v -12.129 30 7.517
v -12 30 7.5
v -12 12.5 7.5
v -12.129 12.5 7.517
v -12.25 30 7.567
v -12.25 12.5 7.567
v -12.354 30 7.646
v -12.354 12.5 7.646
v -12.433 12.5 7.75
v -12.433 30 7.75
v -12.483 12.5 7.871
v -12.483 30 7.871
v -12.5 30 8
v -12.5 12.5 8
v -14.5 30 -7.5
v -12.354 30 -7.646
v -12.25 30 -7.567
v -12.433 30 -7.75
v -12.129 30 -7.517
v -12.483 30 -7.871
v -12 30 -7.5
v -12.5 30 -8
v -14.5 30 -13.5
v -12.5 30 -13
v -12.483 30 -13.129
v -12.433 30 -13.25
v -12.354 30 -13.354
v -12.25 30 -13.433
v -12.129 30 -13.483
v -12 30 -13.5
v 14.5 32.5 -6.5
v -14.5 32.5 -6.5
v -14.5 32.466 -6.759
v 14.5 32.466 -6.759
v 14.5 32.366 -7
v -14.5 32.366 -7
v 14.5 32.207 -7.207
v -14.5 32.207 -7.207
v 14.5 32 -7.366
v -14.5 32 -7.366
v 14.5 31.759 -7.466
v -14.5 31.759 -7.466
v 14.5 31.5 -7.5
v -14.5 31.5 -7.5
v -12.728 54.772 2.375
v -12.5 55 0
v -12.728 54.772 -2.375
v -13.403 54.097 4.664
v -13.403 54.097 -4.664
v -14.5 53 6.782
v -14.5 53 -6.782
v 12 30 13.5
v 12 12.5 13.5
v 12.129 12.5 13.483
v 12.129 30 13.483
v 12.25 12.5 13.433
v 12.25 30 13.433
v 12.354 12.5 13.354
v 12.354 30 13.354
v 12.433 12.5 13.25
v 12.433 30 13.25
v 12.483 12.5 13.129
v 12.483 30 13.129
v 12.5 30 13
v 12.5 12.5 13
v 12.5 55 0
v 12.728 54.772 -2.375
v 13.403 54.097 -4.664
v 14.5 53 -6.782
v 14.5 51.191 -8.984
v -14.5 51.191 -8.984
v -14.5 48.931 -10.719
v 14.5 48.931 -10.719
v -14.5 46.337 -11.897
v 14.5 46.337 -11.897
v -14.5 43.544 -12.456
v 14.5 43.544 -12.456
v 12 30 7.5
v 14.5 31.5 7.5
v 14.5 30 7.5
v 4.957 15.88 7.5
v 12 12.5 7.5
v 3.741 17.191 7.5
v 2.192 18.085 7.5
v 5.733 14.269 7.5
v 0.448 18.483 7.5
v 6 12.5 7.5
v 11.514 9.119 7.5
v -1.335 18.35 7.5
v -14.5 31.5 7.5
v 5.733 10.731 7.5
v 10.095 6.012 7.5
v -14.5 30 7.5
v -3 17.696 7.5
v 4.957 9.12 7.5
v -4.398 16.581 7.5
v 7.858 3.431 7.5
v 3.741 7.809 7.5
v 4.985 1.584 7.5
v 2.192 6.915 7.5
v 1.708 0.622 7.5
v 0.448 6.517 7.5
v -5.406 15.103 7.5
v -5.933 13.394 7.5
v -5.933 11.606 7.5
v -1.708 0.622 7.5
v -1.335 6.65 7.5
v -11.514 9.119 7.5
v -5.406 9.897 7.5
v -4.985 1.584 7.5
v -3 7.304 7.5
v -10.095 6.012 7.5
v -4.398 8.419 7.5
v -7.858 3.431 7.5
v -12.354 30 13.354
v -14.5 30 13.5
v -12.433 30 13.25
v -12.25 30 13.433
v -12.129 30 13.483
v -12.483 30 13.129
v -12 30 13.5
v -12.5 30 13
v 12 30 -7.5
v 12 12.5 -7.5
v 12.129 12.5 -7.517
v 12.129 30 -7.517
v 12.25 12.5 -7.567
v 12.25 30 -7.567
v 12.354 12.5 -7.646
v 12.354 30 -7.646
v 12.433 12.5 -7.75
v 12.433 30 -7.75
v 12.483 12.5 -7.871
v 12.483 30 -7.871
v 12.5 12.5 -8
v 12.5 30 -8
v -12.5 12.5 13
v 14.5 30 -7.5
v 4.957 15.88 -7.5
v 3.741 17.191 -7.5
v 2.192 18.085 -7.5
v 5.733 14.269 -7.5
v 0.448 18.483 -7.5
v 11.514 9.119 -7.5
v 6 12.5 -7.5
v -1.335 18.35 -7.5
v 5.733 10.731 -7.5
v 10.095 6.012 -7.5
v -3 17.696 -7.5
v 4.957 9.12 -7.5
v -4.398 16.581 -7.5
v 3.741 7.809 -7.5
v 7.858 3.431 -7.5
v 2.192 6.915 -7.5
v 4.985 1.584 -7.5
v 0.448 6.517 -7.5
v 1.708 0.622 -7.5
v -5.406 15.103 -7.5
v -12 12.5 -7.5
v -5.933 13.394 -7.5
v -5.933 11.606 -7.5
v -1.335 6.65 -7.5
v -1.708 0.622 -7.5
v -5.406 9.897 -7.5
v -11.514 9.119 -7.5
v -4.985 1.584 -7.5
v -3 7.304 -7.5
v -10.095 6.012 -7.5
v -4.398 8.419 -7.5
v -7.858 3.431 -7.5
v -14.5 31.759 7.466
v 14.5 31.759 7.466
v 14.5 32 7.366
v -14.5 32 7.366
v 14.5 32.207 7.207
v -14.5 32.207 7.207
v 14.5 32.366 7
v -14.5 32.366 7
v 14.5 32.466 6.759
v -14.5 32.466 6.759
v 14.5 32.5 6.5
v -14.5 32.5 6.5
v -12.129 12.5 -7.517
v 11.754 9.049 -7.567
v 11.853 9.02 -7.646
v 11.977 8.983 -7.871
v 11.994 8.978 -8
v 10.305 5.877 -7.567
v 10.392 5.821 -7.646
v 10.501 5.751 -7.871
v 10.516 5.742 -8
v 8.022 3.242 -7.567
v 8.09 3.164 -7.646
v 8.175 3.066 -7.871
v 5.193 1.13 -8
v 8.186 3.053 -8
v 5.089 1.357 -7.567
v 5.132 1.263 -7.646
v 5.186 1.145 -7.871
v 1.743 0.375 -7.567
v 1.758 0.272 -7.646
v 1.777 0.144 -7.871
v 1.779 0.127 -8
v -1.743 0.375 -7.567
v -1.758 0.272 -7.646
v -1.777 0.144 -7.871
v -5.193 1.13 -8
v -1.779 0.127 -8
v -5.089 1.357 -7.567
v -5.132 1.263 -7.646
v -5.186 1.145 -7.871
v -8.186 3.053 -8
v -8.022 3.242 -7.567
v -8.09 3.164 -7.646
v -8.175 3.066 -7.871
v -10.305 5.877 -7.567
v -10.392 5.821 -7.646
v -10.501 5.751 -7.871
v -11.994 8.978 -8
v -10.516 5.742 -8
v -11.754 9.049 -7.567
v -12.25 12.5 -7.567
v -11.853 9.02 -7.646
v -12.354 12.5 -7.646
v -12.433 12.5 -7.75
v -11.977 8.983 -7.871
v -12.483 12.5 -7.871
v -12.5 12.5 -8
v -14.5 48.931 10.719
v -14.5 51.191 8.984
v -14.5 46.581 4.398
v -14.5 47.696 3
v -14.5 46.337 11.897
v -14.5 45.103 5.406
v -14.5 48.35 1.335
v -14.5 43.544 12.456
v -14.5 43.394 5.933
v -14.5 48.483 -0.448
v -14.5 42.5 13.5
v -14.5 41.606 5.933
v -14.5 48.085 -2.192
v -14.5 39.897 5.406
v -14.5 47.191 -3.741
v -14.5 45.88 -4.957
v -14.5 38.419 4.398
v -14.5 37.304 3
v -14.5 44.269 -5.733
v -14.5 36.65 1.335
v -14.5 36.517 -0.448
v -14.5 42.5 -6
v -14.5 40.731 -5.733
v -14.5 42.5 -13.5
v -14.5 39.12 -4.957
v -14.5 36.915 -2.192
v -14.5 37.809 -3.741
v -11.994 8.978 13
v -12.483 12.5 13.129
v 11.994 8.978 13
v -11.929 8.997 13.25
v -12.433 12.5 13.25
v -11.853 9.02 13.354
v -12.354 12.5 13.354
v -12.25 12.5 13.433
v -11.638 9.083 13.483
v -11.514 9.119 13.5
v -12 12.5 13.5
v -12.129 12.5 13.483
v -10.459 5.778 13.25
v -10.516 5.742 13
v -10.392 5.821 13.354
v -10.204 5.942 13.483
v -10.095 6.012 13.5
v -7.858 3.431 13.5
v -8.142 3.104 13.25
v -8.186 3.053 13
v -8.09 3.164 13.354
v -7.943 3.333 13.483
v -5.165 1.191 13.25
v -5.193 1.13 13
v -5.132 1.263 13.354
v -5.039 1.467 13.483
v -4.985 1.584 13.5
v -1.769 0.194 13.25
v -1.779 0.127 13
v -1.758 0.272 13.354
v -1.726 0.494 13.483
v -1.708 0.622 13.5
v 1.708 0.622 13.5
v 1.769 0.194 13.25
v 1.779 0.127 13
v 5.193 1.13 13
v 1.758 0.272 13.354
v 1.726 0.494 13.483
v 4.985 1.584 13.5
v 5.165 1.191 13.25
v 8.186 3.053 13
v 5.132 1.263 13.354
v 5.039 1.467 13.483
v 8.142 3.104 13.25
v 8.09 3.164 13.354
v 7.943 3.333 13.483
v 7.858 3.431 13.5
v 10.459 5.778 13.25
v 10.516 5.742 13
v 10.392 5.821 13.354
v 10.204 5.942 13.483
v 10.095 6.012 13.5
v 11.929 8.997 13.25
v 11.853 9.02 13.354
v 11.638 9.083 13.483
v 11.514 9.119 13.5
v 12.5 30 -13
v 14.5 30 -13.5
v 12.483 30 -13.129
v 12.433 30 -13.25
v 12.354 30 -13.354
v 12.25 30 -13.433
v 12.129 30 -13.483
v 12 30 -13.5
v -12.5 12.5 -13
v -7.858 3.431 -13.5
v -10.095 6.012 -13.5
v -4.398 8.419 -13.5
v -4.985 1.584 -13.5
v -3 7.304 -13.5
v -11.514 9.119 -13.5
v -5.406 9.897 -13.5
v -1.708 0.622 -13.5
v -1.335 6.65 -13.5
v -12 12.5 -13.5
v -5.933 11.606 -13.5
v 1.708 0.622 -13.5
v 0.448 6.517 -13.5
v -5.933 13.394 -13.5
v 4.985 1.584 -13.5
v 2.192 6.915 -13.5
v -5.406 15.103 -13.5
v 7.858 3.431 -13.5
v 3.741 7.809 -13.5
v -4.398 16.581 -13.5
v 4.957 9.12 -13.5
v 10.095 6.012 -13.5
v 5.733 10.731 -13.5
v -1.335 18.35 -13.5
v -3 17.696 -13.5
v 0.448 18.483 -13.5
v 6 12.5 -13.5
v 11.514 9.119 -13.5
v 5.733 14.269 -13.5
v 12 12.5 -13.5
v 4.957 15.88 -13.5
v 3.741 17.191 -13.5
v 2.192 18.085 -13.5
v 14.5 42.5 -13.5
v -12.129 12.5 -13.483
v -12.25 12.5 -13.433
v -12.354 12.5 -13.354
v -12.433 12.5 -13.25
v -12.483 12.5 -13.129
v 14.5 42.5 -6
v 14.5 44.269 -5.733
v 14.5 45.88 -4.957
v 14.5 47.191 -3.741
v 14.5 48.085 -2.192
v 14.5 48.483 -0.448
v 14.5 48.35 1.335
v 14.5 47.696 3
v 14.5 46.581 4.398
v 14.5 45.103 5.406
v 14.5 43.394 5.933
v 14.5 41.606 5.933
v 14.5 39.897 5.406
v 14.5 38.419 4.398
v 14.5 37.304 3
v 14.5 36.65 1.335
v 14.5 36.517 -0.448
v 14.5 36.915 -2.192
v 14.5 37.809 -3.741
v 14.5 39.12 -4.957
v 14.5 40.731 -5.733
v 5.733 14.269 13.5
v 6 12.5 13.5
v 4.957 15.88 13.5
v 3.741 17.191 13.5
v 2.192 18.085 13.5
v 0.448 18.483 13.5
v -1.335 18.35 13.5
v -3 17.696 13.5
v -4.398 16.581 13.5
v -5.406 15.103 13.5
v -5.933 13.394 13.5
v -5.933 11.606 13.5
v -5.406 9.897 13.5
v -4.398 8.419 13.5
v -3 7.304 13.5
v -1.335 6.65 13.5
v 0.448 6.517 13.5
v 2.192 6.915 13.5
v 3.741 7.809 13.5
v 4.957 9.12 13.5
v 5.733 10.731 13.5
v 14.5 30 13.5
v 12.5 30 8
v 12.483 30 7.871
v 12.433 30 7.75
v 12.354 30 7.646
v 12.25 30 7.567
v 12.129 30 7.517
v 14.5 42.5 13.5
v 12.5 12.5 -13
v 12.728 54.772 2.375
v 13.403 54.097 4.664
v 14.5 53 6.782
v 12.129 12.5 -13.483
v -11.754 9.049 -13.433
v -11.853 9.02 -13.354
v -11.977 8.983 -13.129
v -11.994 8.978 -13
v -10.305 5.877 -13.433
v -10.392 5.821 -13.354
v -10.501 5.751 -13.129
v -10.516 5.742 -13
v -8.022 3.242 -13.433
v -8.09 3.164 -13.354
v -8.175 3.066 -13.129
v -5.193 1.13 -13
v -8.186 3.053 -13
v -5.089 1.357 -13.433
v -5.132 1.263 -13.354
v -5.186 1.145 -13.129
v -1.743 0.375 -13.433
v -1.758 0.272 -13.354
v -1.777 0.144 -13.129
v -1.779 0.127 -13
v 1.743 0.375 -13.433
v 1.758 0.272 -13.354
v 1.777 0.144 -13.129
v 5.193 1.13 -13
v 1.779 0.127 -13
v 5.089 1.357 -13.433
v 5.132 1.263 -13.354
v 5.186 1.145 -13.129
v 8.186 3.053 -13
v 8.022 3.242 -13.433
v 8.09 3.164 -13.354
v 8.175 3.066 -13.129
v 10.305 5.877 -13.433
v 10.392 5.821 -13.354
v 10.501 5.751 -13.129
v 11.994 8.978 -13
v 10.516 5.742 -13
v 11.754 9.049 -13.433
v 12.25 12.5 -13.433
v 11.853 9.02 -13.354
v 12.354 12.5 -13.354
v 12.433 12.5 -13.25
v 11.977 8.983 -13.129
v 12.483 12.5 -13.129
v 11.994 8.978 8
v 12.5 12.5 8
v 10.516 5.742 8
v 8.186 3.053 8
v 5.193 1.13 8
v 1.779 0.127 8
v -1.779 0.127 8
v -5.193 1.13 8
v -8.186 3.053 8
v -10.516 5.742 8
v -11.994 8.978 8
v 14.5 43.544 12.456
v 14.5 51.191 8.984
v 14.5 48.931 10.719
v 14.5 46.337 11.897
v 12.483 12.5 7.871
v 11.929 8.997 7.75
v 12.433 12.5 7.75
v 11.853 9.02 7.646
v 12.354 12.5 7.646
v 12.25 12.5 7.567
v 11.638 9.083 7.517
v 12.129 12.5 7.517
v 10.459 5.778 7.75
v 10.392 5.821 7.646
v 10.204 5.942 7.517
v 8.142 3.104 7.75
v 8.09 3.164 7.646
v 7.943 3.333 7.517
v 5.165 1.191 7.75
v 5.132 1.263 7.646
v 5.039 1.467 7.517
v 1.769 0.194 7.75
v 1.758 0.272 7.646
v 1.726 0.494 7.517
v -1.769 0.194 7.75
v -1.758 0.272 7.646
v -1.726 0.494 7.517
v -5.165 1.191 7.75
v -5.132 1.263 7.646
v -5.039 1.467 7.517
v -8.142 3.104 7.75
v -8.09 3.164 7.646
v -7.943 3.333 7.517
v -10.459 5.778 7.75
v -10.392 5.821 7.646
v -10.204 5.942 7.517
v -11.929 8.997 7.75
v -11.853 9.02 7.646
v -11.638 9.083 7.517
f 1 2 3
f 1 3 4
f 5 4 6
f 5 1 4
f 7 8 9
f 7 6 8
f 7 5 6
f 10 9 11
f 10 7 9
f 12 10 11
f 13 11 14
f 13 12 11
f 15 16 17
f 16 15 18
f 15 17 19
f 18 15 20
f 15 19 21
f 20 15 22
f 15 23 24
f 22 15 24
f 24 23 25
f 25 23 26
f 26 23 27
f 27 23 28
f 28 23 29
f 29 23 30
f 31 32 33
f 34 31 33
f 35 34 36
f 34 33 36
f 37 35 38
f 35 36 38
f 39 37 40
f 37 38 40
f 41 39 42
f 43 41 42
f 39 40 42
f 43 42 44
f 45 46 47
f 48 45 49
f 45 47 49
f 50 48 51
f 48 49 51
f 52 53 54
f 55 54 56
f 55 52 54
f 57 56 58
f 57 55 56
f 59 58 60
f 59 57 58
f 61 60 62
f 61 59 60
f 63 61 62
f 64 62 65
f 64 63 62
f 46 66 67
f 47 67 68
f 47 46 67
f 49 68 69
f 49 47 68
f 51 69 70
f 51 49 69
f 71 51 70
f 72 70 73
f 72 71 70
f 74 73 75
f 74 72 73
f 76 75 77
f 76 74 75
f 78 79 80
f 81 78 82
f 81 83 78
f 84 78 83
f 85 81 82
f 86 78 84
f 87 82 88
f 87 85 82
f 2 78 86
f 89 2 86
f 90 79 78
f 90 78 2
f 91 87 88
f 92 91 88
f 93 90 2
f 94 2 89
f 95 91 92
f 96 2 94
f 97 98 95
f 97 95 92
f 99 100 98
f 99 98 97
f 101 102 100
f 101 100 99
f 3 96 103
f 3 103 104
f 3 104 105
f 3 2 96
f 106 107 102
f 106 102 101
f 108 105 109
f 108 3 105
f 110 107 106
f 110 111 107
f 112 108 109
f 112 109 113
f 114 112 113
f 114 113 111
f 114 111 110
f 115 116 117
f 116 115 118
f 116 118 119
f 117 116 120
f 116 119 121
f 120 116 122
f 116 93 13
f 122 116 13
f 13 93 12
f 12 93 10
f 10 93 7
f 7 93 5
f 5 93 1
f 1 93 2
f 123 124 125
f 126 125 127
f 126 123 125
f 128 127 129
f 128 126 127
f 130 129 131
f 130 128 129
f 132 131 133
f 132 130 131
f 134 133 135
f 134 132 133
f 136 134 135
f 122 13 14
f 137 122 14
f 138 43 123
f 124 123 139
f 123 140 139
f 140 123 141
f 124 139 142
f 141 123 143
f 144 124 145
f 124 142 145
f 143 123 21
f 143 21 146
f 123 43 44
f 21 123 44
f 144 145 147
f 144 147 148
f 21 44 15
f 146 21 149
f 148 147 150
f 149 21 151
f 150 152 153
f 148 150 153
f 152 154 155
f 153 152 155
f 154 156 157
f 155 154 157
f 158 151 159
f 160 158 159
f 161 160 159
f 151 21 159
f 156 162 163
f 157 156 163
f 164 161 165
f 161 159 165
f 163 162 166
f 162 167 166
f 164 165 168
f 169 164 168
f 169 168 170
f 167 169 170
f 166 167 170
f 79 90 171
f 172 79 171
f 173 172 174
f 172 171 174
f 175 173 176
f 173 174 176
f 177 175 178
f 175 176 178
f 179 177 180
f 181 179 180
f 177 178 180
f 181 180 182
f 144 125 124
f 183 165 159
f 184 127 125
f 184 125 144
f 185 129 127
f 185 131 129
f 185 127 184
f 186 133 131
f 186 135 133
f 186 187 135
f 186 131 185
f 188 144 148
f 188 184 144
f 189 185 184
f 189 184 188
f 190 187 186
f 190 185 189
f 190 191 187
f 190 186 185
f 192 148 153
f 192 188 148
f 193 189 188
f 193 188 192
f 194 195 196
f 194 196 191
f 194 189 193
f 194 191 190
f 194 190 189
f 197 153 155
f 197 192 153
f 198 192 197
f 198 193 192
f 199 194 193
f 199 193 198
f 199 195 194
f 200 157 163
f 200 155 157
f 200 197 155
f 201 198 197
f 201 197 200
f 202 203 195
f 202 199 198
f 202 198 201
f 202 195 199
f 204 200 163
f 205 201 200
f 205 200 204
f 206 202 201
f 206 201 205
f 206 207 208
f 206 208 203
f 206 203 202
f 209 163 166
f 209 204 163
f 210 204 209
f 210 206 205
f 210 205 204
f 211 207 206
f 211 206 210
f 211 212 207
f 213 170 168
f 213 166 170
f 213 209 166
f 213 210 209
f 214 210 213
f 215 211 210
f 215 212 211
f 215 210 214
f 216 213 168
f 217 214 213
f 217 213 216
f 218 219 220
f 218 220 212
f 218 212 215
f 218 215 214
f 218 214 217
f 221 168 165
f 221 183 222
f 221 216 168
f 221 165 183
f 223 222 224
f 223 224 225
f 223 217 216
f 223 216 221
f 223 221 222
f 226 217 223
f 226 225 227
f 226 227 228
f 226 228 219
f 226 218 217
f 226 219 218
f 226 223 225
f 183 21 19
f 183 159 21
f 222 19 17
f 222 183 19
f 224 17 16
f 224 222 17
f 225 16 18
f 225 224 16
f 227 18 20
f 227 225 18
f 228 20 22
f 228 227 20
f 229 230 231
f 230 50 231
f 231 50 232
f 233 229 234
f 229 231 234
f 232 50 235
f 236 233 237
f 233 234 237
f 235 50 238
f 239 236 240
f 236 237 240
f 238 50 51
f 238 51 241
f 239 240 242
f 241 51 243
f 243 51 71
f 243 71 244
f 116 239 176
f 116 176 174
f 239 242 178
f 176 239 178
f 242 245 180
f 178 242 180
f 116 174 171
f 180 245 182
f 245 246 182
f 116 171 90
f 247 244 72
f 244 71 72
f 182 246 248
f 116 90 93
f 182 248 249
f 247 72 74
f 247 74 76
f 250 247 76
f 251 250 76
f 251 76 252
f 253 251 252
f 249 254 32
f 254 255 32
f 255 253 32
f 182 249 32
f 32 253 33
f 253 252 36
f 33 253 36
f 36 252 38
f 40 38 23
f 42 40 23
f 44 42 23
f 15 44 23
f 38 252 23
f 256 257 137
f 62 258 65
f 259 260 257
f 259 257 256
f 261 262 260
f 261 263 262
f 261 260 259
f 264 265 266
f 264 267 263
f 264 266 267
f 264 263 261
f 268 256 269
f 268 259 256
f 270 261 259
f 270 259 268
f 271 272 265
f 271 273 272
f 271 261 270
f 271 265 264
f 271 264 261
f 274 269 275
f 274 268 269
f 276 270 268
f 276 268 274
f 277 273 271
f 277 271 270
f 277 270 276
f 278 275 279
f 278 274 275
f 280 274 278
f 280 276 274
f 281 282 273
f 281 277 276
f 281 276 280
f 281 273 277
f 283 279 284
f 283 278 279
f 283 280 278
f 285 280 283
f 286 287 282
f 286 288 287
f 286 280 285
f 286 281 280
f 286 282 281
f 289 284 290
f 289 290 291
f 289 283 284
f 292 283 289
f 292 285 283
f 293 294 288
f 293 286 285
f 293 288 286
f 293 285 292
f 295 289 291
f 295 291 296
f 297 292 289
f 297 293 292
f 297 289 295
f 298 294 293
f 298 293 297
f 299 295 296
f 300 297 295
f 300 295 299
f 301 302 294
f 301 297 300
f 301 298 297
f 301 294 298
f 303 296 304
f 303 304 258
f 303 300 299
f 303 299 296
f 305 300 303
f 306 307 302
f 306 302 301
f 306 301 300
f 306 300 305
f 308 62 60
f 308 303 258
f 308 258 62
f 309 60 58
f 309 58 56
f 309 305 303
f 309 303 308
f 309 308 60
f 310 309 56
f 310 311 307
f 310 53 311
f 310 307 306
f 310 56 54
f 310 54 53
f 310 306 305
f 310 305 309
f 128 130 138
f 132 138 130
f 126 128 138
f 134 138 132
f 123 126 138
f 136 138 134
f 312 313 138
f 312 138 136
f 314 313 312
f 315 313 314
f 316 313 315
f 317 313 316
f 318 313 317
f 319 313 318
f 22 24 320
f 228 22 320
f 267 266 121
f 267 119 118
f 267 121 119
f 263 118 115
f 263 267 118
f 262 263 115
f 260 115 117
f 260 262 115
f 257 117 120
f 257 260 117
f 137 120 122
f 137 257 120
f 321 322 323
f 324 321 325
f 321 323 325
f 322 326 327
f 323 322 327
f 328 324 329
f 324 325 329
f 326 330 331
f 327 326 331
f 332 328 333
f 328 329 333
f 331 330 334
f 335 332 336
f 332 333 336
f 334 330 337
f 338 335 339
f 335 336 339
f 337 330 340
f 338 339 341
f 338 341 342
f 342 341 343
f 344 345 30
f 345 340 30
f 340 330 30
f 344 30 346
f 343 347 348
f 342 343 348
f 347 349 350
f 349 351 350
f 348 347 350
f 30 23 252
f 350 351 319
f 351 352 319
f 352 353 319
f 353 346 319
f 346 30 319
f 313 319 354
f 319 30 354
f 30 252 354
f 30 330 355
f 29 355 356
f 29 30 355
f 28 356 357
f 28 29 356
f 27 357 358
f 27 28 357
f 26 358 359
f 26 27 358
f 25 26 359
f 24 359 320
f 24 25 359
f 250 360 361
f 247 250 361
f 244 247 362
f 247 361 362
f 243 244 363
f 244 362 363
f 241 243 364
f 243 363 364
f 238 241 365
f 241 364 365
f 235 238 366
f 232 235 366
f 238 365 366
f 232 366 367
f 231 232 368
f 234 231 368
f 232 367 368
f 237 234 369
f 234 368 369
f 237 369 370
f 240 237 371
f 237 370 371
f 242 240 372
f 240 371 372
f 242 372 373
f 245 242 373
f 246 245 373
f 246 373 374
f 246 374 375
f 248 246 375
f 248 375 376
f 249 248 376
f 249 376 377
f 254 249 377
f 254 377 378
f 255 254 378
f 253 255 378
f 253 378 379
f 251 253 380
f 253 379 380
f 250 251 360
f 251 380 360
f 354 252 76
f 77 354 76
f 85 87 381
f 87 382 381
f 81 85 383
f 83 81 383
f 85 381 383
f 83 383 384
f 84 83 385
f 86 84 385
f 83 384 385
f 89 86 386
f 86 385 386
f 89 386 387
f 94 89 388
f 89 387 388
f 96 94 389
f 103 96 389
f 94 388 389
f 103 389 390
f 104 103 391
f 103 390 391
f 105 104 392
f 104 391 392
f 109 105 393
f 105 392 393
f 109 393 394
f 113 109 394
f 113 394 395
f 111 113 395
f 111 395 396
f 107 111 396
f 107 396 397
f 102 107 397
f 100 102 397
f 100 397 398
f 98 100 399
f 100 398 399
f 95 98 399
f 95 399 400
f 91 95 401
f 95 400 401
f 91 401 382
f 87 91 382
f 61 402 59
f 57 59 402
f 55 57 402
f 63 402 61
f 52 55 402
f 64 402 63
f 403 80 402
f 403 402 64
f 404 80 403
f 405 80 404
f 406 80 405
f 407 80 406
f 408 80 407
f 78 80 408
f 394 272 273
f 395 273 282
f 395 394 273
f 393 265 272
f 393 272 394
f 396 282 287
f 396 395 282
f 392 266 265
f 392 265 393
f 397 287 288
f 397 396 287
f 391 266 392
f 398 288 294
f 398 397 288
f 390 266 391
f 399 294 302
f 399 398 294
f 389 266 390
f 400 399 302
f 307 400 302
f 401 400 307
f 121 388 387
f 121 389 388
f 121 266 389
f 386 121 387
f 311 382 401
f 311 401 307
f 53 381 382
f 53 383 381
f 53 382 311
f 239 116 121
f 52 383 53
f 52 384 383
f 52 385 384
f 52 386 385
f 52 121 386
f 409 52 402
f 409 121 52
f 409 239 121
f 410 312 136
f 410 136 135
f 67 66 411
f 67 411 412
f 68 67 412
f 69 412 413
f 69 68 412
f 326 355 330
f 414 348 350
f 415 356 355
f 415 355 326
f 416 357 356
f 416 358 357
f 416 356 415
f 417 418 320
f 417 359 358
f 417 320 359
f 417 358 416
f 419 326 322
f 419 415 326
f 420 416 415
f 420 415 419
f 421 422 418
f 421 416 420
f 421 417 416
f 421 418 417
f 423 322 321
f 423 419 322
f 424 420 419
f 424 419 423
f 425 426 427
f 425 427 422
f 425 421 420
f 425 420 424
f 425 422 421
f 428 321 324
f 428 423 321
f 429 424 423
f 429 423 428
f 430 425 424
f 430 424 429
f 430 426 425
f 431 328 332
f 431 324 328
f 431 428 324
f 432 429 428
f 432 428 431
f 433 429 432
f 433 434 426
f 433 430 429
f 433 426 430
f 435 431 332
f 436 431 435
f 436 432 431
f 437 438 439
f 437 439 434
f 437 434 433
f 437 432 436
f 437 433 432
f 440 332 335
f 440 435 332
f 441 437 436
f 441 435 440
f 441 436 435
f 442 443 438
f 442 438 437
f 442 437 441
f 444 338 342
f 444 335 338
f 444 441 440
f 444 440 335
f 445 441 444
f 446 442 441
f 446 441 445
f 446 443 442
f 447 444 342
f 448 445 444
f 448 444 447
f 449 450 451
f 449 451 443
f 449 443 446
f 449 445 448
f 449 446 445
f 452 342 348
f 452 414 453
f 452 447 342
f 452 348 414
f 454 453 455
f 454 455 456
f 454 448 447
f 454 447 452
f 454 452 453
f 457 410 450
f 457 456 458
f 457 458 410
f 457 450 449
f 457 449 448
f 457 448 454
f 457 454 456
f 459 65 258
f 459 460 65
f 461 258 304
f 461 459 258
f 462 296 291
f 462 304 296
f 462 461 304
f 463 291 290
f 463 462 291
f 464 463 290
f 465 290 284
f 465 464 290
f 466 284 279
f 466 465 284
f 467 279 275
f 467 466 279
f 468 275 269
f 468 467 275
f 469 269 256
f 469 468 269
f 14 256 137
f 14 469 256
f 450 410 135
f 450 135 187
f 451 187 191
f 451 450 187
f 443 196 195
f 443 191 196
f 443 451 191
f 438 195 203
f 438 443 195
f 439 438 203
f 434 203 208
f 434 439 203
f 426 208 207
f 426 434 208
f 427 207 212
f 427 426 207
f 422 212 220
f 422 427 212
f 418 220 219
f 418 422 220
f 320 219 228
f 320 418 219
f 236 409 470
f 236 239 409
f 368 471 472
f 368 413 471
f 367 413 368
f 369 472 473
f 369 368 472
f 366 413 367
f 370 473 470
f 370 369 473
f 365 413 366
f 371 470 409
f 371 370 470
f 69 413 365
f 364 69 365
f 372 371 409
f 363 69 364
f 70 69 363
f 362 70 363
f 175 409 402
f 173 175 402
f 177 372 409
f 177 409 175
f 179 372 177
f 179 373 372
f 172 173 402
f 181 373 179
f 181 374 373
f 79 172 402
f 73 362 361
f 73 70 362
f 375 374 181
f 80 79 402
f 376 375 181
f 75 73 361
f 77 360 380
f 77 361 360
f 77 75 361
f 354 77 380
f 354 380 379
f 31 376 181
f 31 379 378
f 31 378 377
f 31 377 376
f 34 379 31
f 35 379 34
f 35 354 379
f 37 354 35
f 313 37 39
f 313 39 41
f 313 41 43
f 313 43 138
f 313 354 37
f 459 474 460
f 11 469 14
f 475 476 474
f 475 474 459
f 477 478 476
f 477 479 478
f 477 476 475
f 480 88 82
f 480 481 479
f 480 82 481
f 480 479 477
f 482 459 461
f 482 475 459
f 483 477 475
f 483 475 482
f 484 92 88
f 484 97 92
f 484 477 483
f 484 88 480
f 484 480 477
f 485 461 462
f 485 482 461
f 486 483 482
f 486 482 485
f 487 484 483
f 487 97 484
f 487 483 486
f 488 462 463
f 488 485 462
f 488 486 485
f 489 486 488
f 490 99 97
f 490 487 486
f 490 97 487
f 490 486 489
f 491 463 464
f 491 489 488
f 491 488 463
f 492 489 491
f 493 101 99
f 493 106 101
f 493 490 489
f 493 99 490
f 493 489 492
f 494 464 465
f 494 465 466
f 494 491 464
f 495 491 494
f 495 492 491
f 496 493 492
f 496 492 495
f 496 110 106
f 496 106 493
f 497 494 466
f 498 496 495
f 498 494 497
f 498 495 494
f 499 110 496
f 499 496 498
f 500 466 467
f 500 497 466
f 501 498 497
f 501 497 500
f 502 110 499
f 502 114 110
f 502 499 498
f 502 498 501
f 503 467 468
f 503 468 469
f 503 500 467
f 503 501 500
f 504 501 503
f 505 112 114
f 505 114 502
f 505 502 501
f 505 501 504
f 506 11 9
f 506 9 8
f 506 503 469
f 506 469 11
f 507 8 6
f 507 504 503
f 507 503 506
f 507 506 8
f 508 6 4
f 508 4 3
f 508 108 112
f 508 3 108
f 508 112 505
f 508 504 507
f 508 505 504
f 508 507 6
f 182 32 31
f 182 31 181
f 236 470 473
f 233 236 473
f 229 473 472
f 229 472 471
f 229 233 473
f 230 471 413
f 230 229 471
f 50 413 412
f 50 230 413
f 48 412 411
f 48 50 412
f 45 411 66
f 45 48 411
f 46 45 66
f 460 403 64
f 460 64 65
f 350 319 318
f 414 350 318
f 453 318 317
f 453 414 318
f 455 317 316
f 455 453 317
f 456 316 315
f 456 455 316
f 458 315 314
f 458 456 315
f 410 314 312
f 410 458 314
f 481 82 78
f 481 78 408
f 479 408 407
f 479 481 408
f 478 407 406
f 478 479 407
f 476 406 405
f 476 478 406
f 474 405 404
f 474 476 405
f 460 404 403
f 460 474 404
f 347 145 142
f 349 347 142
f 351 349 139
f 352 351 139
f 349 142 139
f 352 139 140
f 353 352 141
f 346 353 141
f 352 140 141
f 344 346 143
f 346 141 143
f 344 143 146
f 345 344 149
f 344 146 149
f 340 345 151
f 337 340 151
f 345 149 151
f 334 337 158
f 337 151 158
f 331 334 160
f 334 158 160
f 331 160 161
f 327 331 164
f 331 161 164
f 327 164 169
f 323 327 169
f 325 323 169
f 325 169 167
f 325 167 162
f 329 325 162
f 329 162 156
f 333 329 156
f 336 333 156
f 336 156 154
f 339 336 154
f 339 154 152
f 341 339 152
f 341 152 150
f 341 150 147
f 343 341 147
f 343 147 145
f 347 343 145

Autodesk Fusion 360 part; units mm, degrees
sketch "Sketch1" plane through (0, 0, 0) normal (0, 0, 1) x (1, 0, 0)
  line L0 (0, 0) -> (0, 55) construction
  line L1 (0, 12.5) -> (12.5, 12.5) construction
  arc A0 (0, 0) -> (12.5, 12.5) centre (0, 12.5) ccw
  line L2 (0, 55) -> (12.5, 55)
  line L3 (12.5, 55) -> (12.5, 12.5)
  line L4 (0, 55) -> (-12.5, 55)
  line L5 (-12.5, 55) -> (-12.5, 12.5)
  arc A1 (-12.5, 12.5) -> (0, 0) centre (0, 12.5) ccw
  line L6 (14.5, 55) -> (14.5, 12.5) construction
  line L7 (12.5, 55) -> (14.5, 53)
  line L8 (12.5, 55) -> (26.8265, 55) construction
  line L9 (14.5, 53) -> (14.5, 30)
  line L10 (14.5, 30) -> (12.5, 30)
  line L11 (-14.5, 30) -> (-12.5, 30)
  line L12 (-12.5, 55) -> (-26.8265, 55) construction
  line L13 (-14.5, 53) -> (-14.5, 30)
  line L14 (-14.5, 55) -> (-12.5, 55)
  line L15 (12.5, 55) -> (14.5, 55)
  line L16 (-12.5, 55) -> (-14.5, 53)
  dimension "d1" = 55
  dimension "d2" = 25
  dimension "d4" = 12.5
  dimension "d5" = 2
  dimension "d6" = 45
  dimension "d7" = 25
extrude "Extrude1" add sketch "Sketch1" along normal mid plane 27
sketch "Sketch2" plane through (0, 0, 13.5) normal (0, 0, 1) x (1, 0, 0)
  line L0 (12.5, 55) -> (-12.5, 55)
  line L1 (-12.5, 55) -> (-14.5, 53)
  line L2 (-14.5, 53) -> (-14.5, 30)
  line L3 (-14.5, 30) -> (-12.5, 30)
  line L4 (-12.5, 30) -> (-12.5, 12.5)
  arc A0 (-12.5, 12.5) -> (12.5, 12.5) centre (0, 12.5) ccw
  line L5 (12.5, 12.5) -> (12.5, 30)
  line L6 (12.5, 30) -> (14.5, 30)
  line L7 (14.5, 30) -> (14.5, 53)
  line L8 (14.5, 53) -> (12.5, 55)
  arc A1 (-12.5, 12.5) -> (12.5, 12.5) centre (0, 12.5) ccw
  circle A2 centre (0, 12.5) radius 6
  dimension "d10" = 12
extrude "Extrude2" cut sketch "Sketch2" against normal through all contours A2
sketch "Sketch3" plane through (0, 0, 0) normal (1, 0, 0) x (0, 0, -1)
  line L0 (13.5, 18.5) -> (13.5, 6.5) construction
  line L1 (-13.5, 6.5) -> (-13.5, 18.5) construction
  line L2 (13.5, 55) -> (-13.5, 55) construction
  line L3 (13.5, 30) -> (13.5, 53) construction
  line L4 (13.5, 53) -> (13.5, 55) construction
  line L5 (-13.5, 55) -> (-13.5, 53) construction
  line L6 (-13.5, 53) -> (-13.5, 30) construction
  line L7 (-13.5, 30) -> (-13.5, 12.5) construction
  line L8 (13.5, 12.5) -> (13.5, 30) construction
  line L9 (13.5, 0) -> (13.5, 12.5) construction
  line L10 (-13.5, 12.5) -> (-13.5, 0) construction
  line L11 (13.5, 12.5) -> (-13.5, 12.5) construction
  line L12 (-13.5, 12.5) -> (-13.5, 0) construction
  line L13 (-13.5, 12.5) -> (13.5, 12.5) construction
  line L14 (13.5, 0) -> (13.5, 12.5) construction
  line L15 (13.5, 0) -> (-13.5, 0) construction
  line L16 (-13.5, 42.5) -> (13.5, 42.5) construction
  line L17 (13.5, 32.5) -> (-13.5, 32.5) construction
  line L18 (13.5, 32.5) -> (13.5, 2)
  line L19 (7.5, 31.5) -> (7.5, 0)
  line L20 (11.5, 0) -> (7.5, 0)
  line L21 (0, 32.5) -> (6.5, 32.5)
  arc A0 (7.5, 31.5) -> (6.5, 32.5) centre (6.5, 31.5) ccw
  line L22 (0, 55) -> (0, 0) construction
  circle A1 centre (0, 42.5) radius 12.5 construction
  line L23 (13.5, 42.5) -> (12.4564, 43.5436)
  line L24 (13.5, 42.5) -> (21.4057, 42.5) construction
  arc A2 (12.4564, 43.5436) -> (0, 55) centre (0, 42.5) ccw
  line L25 (13.5, 42.5) -> (13.5, 32.5)
  arc A3 (0, 55) -> (-12.4564, 43.5436) centre (0, 42.5) ccw
  line L26 (-13.5, 42.5) -> (-12.4564, 43.5436)
  line L27 (-13.5, 42.5) -> (-13.5, 32.5)
  line L28 (-13.5, 32.5) -> (-13.5, 2)
  line L29 (-11.5, 0) -> (-7.5, 0)
  line L30 (-7.5, 31.5) -> (-7.5, 0)
  arc A4 (-6.5, 32.5) -> (-7.5, 31.5) centre (-6.5, 31.5) ccw
  line L31 (0, 32.5) -> (-6.5, 32.5)
  line L32 (7.5, 0) -> (-7.5, 0)
  line L33 (-11.5, 0) -> (-13.5, 0)
  line L34 (-13.5, 2) -> (-13.5, 0)
  line L35 (13.5, 2) -> (13.5, 0)
  line L36 (13.5, 0) -> (11.5, 0)
  line L37 (13.5, 55) -> (13.5, 42.5)
  line L38 (13.5, 55) -> (0, 55)
  line L39 (0, 55) -> (-13.5, 55)
  line L40 (-13.5, 55) -> (-13.5, 42.5)
  circle A5 centre (0, 42.5) radius 6
  dimension "d12" = 30
  dimension "d13" = 20
  dimension "d16" = 1
  dimension "d17" = 25
  dimension "d18" = 135
  dimension "d21" = 12
extrude "Extrude3" cut sketch "Sketch3" along normal through all and the other way through all contours L23 A2 L37 L38 | A3 L26 L39 L40 | L19 L21 A0 L30 A4 L31 L32 | A5
fillet "Fillet1" radius 0.5 12 edges at (12.5, 21.25, -13.5) (0, 0, -13.5) (-12.5, 21.25, -13.5) (12.5, 21.25, -7.5) (0, 0, -7.5) (-12.5, 21.25, -7.5) (-12.5, 21.25, 7.5) (0, 0, 7.5) (12.5, 21.25, 7.5) (-12.5, 21.25, 13.5) (0, 0, 13.5) (12.5, 21.25, 13.5)
equation "d1 = 12.5 mm + 30 mm + 12.5 mm"
equation "d2 = ( 12.5 * 2 ) * 1 mm"
equation "d8 = 6 mm + 15 mm + 6 mm"
equation "d17 = ( 12.5 * 2 ) * 1 mm"
